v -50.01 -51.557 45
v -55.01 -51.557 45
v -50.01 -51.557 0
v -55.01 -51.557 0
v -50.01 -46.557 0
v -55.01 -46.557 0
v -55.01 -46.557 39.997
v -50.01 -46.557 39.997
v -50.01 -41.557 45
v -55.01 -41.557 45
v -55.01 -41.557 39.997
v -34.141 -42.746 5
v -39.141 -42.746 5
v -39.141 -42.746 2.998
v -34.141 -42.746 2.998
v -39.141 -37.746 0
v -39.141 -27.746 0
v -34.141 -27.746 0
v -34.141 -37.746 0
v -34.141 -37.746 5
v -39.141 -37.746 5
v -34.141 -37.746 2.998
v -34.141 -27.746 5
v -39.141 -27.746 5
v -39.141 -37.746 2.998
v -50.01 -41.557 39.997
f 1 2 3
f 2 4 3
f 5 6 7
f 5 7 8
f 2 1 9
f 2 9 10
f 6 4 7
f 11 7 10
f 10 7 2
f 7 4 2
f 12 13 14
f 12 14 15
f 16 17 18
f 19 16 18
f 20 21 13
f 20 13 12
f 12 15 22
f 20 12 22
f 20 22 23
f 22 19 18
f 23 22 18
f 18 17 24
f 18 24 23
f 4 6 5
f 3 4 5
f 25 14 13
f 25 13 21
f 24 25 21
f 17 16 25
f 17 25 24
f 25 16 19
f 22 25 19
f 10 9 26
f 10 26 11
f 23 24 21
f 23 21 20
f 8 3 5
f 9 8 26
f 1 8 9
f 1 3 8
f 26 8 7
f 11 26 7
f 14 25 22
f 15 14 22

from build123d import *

# Parameters (mm, degrees)
F0_W     = 5
F0_H     = 5
F1_DEPTH = 40
F2_W     = 5
F2_H     = 5
F3_DEPTH = 5
F4_W     = 5
F4_H     = 5.003342
F5_DEPTH = 5
F6_W     = 5
F6_H     = 10
F7_DEPTH = 5
F8_W     = 5
F8_H     = 2.001993
F9_DEPTH = 5


with BuildPart() as f1:
    # F0 (on Top) → F1 (new body)
    with BuildSketch(Plane.XY):
        with Locations((-52.510245, -49.056859)):
            Rectangle(F0_W, F0_H)
    extrude(amount=F1_DEPTH)

    # F2 (on face) → F3 (join)
    with BuildSketch(Plane.XY.offset(40)):
        with Locations((-52.510245, -49.056859)):
            Rectangle(F2_W, F2_H)
    extrude(amount=F3_DEPTH)

    # F4 (on face) → F5 (join)
    with BuildSketch(Plane(origin=(0, -46.556859, 0), x_dir=(-1, 0, 0), z_dir=(0, 1, 0))):
        with Locations((52.510245, 42.498329)):
            Rectangle(F4_W, F4_H)
    extrude(amount=F5_DEPTH)


with BuildPart() as f7:
    # F6 (on Top) → F7 (new body)
    with BuildSketch(Plane.XY):
        with Locations((-36.64107, -32.746012)):
            Rectangle(F6_W, F6_H)
    extrude(amount=F7_DEPTH)

    # F8 (on face) → F9 (join)
    with BuildSketch(Plane.XZ.offset(37.746012)):
        with Locations((-36.64107, 3.999003)):
            Rectangle(F8_W, F8_H)
    extrude(amount=F9_DEPTH)


solid = Compound([f1.part, f7.part])
